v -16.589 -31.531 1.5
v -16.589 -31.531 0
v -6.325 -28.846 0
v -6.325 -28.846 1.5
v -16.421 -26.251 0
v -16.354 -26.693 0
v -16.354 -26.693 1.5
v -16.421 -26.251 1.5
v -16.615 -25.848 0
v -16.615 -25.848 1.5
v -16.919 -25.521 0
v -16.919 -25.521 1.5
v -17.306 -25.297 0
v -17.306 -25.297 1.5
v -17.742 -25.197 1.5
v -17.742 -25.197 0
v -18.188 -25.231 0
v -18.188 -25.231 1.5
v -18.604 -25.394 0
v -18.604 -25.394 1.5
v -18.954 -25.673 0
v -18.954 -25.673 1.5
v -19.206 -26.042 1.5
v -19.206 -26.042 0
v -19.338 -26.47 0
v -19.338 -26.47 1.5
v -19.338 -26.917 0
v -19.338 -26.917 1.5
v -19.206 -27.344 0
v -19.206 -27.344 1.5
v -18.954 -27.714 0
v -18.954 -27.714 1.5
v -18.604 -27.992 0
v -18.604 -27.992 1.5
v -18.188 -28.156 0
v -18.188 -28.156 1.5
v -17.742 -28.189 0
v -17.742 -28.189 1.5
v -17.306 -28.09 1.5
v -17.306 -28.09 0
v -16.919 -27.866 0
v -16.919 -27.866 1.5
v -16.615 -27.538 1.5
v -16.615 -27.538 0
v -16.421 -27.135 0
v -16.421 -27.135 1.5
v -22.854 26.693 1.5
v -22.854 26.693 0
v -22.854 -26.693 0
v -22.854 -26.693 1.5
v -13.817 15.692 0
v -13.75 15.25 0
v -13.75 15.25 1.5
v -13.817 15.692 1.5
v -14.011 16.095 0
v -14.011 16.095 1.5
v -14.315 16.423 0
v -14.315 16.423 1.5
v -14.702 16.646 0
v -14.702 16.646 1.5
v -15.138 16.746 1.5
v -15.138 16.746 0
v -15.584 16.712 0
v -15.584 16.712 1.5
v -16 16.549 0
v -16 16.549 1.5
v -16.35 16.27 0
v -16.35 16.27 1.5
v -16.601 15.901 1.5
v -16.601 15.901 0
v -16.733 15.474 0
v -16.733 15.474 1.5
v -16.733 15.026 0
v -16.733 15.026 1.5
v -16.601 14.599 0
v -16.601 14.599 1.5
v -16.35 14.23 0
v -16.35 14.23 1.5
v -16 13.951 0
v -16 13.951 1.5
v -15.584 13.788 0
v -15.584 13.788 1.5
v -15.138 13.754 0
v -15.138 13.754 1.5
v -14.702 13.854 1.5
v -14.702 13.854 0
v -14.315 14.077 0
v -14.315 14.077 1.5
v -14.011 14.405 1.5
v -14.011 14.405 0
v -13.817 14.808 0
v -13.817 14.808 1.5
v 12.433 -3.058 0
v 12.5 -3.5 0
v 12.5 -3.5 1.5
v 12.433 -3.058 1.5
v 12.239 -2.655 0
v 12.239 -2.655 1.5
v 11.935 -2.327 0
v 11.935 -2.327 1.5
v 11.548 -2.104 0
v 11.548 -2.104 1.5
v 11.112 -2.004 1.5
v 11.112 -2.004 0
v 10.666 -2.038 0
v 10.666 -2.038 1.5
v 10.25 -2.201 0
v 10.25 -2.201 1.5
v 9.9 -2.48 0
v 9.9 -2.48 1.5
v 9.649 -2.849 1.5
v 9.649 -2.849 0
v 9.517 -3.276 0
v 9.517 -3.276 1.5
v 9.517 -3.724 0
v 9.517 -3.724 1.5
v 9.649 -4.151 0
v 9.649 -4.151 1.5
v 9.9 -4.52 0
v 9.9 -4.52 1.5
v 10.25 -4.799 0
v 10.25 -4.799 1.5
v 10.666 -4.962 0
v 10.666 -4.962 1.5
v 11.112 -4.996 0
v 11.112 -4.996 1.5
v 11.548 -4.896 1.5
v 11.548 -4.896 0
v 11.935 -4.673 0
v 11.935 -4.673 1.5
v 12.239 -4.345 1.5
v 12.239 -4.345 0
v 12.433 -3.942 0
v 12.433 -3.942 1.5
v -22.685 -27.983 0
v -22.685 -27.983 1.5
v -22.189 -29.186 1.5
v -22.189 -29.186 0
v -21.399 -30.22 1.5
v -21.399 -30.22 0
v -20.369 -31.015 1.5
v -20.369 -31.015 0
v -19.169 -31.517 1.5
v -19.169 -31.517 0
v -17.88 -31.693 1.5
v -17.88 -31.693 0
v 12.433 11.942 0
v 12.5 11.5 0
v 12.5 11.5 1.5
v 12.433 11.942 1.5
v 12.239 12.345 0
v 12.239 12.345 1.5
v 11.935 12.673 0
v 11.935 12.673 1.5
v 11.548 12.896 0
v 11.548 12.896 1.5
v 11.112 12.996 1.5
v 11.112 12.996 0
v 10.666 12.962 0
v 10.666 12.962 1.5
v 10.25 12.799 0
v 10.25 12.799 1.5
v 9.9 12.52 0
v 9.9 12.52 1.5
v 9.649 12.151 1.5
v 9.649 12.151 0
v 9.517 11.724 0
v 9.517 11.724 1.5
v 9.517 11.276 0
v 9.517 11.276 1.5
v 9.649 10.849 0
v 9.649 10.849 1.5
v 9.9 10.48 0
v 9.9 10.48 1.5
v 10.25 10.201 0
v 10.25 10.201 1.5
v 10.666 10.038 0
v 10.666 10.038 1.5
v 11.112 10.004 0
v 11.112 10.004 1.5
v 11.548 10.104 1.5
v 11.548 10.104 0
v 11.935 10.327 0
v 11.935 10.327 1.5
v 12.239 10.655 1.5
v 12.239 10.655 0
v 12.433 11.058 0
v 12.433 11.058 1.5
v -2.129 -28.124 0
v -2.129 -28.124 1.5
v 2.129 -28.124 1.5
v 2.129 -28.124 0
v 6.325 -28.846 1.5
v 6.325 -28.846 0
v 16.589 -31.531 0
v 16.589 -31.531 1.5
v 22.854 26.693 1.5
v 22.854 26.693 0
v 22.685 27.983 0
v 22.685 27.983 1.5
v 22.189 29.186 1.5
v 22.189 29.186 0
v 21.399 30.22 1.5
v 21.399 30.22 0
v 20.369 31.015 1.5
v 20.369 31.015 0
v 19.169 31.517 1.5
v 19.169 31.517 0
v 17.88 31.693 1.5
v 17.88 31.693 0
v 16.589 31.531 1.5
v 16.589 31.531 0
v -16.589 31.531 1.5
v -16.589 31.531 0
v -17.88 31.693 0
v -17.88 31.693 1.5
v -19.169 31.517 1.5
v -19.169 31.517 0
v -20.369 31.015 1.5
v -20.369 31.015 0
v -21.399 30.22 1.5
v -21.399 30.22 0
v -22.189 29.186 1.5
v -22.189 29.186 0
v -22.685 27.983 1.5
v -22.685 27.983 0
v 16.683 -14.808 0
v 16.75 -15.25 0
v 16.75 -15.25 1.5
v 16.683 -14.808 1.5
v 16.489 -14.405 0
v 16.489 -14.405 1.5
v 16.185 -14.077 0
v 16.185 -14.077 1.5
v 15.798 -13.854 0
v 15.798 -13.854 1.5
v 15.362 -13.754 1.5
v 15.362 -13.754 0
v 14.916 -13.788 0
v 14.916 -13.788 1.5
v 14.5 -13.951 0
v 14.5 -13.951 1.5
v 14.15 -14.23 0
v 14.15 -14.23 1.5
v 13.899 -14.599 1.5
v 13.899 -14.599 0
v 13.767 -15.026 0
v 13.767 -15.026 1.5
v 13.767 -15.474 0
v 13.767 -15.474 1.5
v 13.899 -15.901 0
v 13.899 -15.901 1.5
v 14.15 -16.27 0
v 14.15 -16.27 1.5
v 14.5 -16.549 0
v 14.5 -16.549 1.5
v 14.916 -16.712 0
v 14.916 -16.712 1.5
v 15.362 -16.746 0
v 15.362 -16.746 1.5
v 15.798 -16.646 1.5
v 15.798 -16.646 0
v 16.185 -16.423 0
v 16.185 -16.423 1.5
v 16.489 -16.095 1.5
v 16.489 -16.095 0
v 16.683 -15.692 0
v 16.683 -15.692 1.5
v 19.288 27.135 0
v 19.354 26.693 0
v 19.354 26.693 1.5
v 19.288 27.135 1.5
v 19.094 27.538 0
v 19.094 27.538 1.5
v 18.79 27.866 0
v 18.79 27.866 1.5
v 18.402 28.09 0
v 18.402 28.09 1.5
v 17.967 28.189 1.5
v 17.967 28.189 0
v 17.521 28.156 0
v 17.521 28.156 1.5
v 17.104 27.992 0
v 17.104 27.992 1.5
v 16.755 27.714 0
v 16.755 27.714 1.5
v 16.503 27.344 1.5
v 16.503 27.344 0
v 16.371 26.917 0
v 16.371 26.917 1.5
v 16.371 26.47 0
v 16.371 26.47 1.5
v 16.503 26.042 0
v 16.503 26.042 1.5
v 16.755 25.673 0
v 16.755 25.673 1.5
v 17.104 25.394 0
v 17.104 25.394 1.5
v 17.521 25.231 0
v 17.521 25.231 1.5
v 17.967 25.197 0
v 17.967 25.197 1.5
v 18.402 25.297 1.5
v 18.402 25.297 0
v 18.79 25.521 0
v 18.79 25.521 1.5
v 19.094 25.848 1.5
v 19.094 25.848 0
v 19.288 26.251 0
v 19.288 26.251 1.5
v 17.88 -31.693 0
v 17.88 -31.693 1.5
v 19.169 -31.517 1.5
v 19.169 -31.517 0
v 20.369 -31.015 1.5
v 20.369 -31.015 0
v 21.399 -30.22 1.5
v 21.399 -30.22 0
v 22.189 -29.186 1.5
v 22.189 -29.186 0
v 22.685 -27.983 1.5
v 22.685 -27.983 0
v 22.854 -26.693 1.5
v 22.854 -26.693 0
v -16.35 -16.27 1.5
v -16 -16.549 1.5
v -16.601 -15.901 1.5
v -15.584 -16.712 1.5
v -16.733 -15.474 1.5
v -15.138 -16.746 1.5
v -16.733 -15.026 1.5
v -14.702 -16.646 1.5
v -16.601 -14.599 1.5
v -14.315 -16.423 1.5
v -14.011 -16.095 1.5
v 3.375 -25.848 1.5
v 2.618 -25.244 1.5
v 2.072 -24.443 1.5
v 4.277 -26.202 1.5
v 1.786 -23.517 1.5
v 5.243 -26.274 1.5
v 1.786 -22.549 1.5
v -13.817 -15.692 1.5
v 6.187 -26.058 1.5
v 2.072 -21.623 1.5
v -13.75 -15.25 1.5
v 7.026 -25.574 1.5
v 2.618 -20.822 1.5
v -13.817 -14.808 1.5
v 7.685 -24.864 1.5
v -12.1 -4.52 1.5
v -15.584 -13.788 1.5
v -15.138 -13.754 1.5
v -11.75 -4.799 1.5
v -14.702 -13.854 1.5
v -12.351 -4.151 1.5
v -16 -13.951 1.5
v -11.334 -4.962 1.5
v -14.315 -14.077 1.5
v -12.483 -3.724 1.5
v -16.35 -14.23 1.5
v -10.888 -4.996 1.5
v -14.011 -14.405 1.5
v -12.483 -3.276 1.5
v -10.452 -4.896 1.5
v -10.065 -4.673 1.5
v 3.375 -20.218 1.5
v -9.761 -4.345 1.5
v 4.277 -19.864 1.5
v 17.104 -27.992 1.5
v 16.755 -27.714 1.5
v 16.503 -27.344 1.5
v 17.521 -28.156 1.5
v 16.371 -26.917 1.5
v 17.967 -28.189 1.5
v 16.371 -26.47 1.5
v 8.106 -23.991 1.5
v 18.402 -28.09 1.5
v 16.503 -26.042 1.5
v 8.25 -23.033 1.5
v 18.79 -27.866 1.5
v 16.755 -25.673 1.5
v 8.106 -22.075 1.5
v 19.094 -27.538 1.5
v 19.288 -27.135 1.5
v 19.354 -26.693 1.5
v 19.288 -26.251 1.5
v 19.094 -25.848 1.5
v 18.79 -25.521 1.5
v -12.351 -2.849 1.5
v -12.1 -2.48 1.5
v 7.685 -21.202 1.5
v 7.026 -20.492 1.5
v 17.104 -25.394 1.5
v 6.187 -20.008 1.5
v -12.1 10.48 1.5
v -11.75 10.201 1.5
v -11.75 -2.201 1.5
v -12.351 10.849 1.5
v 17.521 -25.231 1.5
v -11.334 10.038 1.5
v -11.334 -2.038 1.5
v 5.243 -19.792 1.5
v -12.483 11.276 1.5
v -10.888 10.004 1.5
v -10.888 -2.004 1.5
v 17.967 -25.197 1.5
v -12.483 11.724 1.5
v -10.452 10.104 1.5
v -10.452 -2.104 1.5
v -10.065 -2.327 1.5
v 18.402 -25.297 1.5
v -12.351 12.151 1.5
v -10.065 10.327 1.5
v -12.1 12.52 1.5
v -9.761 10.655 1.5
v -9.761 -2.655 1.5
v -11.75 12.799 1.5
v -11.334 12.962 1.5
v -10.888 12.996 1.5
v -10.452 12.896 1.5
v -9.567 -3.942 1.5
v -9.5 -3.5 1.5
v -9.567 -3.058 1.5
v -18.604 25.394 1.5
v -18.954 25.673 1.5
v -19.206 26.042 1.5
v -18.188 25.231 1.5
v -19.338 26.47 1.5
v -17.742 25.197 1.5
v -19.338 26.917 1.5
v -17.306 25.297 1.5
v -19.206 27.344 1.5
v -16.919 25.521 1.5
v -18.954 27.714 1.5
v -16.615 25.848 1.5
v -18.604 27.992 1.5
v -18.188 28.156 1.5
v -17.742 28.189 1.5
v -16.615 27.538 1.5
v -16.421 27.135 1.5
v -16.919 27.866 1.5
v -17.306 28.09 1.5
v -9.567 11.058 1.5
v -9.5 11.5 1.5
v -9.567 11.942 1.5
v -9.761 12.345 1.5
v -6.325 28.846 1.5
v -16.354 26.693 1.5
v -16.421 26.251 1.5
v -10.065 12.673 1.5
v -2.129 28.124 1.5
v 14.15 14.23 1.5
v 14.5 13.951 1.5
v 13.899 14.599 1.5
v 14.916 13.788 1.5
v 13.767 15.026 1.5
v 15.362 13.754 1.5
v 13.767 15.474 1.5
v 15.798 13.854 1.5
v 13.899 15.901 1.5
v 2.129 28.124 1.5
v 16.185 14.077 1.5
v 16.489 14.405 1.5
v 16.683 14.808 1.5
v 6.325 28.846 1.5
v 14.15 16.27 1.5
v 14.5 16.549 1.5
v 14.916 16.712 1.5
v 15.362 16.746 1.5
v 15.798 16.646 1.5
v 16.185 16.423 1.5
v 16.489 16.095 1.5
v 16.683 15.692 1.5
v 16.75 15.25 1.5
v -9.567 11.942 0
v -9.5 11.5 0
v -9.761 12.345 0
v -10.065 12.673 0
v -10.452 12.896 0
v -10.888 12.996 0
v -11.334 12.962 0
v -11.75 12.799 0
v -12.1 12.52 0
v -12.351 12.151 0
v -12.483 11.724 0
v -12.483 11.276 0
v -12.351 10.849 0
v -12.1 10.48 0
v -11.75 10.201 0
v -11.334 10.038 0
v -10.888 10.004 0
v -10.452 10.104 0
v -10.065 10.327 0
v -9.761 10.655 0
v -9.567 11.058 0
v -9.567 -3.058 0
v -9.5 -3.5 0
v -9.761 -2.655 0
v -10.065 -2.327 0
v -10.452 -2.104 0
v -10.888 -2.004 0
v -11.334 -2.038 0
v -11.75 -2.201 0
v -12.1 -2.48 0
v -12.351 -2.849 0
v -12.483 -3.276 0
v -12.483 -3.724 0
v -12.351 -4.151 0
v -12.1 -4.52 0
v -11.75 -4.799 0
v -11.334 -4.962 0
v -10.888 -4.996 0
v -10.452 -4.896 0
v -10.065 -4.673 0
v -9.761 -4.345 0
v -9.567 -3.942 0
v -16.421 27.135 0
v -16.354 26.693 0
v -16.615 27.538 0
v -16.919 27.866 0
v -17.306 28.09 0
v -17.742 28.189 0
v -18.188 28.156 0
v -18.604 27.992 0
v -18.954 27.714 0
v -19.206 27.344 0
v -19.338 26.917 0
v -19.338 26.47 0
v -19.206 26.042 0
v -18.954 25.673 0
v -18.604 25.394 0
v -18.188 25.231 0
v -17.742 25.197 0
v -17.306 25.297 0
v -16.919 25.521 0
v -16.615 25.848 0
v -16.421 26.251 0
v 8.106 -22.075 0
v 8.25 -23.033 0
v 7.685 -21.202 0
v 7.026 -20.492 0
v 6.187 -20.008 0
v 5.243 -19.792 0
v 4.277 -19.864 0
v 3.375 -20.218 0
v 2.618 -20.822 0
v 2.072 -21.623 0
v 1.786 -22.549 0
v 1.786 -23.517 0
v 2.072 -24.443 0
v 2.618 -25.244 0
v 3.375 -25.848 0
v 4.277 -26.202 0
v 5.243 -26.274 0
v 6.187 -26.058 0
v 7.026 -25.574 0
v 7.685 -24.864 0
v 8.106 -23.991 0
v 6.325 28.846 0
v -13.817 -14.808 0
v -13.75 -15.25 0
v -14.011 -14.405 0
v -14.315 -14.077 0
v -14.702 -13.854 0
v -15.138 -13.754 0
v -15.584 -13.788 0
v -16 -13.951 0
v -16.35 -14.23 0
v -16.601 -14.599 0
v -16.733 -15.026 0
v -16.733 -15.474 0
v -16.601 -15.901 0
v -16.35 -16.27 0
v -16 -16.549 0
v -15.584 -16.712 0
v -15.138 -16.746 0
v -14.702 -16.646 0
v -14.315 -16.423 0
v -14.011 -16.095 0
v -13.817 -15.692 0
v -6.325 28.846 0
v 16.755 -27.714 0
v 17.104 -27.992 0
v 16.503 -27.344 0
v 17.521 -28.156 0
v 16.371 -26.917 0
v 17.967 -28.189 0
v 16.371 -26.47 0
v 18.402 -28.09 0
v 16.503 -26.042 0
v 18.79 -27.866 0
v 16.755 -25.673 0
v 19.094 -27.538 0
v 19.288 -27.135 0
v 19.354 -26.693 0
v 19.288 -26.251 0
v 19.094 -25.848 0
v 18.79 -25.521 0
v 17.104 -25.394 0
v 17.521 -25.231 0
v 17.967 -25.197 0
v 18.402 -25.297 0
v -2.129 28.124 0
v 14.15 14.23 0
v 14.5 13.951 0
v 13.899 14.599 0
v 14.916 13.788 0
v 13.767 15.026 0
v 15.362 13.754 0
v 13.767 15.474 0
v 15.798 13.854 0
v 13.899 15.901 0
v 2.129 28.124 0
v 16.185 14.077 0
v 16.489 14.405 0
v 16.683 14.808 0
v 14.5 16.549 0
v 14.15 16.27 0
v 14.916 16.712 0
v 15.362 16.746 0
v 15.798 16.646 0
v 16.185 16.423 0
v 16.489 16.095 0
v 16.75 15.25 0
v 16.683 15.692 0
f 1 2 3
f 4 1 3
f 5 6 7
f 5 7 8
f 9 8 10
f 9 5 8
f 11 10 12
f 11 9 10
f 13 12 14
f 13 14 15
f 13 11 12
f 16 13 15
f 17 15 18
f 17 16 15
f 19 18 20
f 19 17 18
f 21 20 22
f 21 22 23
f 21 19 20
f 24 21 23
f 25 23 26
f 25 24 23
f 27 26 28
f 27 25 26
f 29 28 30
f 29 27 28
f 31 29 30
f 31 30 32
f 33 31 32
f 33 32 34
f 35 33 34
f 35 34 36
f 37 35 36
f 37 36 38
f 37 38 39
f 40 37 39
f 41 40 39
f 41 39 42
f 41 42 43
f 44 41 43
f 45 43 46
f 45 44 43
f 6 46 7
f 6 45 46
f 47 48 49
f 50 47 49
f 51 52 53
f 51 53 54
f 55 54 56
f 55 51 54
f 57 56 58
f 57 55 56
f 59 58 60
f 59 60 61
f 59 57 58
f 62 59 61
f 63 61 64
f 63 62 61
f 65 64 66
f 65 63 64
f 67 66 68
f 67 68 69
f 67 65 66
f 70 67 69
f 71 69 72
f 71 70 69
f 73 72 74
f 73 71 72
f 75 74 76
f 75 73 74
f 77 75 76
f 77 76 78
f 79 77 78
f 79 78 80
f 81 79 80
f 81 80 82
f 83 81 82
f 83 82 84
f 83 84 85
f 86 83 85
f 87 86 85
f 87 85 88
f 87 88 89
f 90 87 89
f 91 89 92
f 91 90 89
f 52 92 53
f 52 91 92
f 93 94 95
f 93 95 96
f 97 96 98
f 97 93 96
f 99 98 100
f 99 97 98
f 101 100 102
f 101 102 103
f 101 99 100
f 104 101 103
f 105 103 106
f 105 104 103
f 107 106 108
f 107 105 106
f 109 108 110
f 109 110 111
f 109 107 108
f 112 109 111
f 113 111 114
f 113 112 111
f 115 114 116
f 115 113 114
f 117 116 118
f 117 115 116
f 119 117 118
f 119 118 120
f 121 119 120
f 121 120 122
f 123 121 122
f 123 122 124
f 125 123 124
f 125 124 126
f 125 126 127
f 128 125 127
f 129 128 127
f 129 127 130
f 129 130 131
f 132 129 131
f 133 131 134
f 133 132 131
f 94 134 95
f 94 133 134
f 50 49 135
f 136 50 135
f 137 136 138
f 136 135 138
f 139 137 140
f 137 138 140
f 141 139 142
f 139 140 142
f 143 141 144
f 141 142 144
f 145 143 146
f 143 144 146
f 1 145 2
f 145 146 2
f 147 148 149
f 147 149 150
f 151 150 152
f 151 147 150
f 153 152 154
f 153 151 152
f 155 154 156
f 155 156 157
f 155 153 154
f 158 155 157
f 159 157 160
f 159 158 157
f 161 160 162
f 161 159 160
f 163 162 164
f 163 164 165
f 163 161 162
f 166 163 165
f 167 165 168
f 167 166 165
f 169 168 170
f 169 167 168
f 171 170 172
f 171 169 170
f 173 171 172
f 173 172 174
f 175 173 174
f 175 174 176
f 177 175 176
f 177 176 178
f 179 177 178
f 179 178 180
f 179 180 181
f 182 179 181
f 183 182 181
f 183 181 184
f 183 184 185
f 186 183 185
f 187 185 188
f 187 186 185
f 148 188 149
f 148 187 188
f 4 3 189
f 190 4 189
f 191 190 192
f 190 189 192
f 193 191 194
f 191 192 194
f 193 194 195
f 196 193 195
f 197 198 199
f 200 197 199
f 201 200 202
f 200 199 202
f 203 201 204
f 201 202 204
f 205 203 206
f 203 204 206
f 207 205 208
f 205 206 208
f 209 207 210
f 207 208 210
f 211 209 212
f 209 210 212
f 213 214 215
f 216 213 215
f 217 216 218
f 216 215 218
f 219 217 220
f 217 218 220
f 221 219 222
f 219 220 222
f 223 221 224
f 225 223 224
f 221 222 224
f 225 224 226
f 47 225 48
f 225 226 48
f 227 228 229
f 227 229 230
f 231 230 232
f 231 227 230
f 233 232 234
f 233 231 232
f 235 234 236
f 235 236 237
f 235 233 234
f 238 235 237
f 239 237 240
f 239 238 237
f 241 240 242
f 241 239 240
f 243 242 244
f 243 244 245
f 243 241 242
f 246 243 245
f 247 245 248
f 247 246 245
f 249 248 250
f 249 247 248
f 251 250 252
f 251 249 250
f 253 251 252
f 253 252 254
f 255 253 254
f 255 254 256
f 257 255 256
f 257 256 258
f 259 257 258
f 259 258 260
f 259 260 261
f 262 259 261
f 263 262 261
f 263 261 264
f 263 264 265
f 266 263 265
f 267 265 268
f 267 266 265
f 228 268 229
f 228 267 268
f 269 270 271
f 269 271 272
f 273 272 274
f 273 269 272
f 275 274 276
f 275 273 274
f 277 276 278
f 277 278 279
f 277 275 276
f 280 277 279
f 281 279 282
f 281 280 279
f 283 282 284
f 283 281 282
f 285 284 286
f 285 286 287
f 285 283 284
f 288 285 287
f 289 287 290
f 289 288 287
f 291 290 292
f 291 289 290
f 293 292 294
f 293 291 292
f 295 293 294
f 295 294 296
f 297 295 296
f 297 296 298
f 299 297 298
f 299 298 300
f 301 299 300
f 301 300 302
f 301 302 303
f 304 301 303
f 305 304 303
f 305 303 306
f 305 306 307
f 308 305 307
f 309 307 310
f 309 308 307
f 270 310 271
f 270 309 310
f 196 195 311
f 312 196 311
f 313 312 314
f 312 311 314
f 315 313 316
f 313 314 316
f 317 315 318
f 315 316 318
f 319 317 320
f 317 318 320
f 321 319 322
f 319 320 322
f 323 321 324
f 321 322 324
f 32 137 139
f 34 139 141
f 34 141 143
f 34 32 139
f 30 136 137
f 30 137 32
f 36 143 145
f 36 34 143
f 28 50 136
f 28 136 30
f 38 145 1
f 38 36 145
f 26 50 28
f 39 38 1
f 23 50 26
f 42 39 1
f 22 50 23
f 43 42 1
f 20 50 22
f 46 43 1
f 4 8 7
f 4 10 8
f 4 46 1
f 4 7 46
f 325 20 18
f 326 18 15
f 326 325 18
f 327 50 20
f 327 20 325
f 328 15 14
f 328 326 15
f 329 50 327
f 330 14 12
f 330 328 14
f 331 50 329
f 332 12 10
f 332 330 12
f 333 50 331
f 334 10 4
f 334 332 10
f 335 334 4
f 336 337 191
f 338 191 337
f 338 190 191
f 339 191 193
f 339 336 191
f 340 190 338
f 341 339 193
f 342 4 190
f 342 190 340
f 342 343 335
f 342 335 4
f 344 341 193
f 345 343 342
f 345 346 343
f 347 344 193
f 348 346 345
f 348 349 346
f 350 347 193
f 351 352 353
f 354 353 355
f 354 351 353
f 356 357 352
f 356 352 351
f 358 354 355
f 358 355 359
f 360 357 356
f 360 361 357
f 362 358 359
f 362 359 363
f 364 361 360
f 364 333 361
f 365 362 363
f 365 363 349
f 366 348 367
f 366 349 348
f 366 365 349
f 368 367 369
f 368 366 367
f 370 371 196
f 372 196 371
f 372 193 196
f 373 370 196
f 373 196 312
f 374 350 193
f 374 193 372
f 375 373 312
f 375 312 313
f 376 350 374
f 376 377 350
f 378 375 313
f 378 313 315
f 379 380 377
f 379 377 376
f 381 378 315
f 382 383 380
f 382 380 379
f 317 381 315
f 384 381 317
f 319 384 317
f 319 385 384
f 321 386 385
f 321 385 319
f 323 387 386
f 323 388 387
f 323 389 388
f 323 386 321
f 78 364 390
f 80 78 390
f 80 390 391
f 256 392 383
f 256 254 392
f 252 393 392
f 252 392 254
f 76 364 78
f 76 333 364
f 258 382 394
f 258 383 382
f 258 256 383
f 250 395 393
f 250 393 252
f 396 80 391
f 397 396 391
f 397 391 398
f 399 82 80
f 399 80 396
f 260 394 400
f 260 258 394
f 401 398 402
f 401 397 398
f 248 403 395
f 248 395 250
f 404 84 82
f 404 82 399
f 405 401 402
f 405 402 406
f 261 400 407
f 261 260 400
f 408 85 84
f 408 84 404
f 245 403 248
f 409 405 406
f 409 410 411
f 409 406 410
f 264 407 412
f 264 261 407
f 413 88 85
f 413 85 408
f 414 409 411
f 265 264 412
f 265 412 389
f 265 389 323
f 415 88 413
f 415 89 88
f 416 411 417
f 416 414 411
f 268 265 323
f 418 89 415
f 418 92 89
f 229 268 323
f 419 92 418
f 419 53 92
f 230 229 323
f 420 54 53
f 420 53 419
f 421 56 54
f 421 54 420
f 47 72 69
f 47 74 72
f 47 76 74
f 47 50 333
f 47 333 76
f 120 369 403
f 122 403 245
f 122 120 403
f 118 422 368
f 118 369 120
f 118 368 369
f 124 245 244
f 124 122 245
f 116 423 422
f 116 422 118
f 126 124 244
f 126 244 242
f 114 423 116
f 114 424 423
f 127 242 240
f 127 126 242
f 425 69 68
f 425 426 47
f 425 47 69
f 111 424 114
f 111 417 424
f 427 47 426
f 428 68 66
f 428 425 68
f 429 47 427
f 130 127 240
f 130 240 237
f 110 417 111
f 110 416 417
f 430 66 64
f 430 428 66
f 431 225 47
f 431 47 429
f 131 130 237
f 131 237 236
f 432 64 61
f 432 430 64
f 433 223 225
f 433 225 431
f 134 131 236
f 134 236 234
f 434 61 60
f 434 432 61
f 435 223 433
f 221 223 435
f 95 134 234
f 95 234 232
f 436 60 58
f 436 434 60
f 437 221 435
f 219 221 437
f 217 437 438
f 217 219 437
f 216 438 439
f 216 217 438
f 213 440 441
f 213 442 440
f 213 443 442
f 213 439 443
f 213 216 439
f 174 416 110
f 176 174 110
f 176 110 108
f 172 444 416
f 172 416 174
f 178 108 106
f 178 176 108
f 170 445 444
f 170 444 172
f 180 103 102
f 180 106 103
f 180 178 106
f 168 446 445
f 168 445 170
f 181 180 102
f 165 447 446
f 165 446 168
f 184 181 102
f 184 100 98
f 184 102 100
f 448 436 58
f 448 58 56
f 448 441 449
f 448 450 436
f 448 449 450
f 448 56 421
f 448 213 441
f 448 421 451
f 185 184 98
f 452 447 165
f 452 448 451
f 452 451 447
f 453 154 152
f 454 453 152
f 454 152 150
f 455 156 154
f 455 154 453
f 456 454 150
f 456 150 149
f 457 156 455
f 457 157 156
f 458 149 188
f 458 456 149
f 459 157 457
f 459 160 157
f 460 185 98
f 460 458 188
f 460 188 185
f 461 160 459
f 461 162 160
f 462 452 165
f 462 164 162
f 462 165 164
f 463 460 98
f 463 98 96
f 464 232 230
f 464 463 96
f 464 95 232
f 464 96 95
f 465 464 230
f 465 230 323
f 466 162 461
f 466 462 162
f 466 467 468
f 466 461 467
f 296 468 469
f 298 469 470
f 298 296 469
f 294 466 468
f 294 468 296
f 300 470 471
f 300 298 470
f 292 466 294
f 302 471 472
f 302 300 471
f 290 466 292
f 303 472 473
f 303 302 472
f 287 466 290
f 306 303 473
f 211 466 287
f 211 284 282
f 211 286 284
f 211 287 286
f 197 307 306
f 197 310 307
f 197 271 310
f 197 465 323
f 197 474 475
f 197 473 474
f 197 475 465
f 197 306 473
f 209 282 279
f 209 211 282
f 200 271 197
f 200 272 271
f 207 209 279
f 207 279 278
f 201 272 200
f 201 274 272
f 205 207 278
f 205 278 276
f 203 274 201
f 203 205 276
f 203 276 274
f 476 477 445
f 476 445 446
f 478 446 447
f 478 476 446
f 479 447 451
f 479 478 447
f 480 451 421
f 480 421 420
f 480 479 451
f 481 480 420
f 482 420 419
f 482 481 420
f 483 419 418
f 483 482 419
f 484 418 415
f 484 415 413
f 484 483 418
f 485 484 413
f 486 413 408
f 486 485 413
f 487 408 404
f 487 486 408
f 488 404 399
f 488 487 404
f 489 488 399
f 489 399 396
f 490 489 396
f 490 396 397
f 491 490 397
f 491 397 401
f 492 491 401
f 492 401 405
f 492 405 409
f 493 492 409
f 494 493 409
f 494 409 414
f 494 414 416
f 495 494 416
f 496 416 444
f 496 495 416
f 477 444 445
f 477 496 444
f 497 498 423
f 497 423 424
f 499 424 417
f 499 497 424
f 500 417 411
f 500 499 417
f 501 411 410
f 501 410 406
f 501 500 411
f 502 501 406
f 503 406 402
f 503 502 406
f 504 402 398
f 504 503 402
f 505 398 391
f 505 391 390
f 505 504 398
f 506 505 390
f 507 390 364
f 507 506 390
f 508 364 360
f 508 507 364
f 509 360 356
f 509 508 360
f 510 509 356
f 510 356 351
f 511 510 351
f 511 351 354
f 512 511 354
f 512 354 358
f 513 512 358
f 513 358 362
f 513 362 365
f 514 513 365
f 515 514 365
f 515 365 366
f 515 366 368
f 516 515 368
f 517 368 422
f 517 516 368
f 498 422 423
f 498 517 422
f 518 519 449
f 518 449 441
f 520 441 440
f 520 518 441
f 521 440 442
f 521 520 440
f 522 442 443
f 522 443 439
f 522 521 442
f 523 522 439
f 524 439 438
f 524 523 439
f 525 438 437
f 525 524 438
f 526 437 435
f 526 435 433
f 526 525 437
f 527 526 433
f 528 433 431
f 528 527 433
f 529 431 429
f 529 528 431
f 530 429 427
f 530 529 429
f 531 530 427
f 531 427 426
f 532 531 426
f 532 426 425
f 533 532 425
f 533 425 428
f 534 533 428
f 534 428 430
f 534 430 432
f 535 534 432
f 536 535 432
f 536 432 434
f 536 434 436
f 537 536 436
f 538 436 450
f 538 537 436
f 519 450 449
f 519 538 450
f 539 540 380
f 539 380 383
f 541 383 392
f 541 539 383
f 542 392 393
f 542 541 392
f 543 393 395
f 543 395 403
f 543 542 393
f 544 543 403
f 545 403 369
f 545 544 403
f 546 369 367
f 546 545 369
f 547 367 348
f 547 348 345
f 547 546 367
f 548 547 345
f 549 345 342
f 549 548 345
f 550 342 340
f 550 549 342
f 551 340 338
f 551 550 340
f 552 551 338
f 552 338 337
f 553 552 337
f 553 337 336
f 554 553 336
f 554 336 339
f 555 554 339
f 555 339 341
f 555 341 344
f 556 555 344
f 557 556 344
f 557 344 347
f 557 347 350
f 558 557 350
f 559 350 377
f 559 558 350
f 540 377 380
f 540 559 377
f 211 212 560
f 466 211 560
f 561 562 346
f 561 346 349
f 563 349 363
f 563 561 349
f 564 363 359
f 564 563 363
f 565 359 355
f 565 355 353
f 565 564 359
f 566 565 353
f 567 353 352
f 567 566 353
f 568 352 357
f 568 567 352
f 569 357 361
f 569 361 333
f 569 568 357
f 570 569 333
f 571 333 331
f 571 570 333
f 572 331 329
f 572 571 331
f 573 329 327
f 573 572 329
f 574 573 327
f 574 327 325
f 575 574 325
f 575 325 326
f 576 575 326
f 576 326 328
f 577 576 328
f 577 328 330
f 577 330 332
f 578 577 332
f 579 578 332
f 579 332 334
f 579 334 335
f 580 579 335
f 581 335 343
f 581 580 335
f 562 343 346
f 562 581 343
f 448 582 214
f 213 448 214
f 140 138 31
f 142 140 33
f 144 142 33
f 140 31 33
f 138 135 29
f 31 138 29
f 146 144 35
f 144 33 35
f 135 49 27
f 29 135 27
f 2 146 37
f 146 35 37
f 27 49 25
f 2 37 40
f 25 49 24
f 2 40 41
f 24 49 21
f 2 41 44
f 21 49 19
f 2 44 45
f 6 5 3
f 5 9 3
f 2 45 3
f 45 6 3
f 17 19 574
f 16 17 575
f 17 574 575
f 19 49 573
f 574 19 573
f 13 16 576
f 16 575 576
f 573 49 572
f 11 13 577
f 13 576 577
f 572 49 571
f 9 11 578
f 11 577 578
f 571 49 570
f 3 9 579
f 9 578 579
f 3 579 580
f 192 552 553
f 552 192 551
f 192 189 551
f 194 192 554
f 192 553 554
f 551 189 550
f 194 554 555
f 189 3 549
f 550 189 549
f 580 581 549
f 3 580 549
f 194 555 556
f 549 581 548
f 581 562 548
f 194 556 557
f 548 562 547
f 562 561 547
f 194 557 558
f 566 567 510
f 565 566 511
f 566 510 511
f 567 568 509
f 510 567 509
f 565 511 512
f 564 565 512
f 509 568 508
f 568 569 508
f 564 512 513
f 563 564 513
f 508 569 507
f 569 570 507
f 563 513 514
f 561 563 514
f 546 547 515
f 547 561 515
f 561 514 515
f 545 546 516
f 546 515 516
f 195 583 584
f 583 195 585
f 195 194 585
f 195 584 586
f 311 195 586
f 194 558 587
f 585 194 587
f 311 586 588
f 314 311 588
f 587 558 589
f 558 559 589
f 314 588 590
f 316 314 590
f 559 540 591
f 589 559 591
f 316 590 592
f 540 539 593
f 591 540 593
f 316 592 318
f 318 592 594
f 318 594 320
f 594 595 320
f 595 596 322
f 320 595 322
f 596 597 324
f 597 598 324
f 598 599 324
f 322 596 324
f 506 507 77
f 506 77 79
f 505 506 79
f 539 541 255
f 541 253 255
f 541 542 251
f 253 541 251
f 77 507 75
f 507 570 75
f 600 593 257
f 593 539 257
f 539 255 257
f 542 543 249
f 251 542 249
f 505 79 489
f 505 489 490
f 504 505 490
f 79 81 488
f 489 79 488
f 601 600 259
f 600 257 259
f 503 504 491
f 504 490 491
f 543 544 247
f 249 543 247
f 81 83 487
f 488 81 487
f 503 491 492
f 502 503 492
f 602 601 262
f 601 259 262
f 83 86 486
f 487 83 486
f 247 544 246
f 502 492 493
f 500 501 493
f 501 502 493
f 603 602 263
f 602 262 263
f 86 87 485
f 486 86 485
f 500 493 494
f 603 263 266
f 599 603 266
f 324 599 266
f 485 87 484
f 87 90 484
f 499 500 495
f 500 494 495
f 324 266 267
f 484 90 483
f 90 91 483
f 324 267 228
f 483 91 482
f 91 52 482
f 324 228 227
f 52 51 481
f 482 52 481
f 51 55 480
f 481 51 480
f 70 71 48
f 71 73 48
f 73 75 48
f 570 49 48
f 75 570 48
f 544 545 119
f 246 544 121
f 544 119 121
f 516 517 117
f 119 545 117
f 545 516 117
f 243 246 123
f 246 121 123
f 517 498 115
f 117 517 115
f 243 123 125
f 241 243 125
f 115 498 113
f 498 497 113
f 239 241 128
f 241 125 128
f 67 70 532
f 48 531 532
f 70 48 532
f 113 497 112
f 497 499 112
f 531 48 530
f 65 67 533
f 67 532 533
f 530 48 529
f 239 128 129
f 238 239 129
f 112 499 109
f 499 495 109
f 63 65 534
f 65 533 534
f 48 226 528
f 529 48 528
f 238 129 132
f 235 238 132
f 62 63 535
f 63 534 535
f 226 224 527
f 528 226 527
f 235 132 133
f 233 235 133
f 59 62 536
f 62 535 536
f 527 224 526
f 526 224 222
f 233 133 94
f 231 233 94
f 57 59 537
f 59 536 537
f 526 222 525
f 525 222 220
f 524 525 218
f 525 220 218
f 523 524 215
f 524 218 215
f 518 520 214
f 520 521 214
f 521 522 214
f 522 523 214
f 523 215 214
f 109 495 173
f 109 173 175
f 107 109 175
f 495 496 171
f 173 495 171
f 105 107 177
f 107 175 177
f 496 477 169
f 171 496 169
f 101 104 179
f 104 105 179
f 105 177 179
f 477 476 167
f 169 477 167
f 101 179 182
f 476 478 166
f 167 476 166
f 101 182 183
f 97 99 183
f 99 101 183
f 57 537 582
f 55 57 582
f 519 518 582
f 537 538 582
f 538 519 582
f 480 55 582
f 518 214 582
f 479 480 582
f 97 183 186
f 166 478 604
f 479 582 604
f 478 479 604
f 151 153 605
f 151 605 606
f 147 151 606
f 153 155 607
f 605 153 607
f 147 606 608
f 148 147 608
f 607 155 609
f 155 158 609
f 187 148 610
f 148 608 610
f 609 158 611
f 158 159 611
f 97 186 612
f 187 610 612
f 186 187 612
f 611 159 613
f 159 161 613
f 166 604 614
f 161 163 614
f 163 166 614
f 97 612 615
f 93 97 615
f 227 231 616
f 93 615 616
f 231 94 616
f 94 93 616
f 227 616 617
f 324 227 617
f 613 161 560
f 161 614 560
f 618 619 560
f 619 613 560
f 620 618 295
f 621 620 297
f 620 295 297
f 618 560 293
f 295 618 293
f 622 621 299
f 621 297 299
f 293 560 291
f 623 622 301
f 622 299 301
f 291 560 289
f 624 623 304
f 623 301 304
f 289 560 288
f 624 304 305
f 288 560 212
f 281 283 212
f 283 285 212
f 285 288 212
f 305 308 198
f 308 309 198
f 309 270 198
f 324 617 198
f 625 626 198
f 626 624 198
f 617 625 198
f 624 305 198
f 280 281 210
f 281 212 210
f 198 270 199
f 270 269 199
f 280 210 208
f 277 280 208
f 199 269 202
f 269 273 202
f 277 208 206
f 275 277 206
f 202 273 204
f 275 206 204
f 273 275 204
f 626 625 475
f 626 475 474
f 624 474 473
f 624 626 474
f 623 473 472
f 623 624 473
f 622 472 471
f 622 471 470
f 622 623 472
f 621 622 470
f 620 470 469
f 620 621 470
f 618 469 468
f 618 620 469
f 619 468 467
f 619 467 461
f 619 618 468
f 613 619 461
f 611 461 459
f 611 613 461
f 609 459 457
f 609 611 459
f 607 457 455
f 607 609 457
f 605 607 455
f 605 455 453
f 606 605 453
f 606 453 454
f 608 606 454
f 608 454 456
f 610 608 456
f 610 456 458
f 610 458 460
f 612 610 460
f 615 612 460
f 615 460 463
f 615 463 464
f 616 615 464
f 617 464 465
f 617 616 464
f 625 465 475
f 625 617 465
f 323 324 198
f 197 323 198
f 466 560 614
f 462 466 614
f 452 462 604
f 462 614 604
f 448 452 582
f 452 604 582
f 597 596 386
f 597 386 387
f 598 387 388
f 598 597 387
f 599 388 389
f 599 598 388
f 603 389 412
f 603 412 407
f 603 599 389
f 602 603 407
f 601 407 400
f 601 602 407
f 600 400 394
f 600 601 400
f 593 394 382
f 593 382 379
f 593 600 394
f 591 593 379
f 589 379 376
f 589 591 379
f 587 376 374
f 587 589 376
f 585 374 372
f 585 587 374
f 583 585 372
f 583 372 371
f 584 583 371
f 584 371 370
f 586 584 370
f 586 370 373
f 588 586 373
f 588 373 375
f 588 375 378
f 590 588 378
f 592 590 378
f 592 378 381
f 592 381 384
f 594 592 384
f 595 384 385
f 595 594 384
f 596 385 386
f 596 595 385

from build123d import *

# Parameters (mm, degrees)
F0_R     = 1.5
F0_R_2   = 3.25
F1_DEPTH = 1.5


# Not quite as in the source:
# - ends of sketch curves that miss each other by under 0.0002 mm in the source are joined


with BuildPart() as f1:
    # F0 (on Top) → F1 (new body)
    with BuildSketch(Plane.XY):
        with BuildLine():
            ThreePointArc((6.3250610024, 28.8463679906), (-4.837e-07, 28.033009), (-6.3250619384, 28.8463682354))
            Line((-6.3250619384, 28.8463682354), (-16.589434, 31.530609))
            ThreePointArc((-16.589434, 31.530609), (-20.910174001, 30.6508727545), (-22.854447, 26.693281))
            Line((-22.854447, 26.693281), (-22.854447, -26.693281))
            ThreePointArc((-22.854447, -26.693281), (-20.910174001, -30.6508727545), (-16.5894340018, -31.5306089933))
            Line((-16.5894340018, -31.5306089933), (-6.325062, -28.846368))
            ThreePointArc((-6.325062, -28.846368), (-4.837e-07, -28.033009), (6.3250610024, -28.8463679906))
            Line((6.3250610024, -28.8463679906), (16.589434, -31.530609))
            ThreePointArc((16.589434, -31.530609), (20.9101733838, -30.6508724589), (22.854446, -26.693281))
            Line((22.854446, -26.693281), (22.854446, 26.693281))
            ThreePointArc((22.854446, 26.693281), (20.9101733838, 30.6508724589), (16.5894339378, 31.530609238))
            Line((16.5894339378, 31.530609238), (6.3250610024, 28.8463679906))
        make_face()
        with Locations((-17.854447, -26.693281)):
            Circle(F0_R, mode=Mode.SUBTRACT)
        with Locations((-15.25, -15.25)):
            Circle(F0_R, mode=Mode.SUBTRACT)
        with Locations((-11, -3.5)):
            Circle(F0_R, mode=Mode.SUBTRACT)
        with Locations((5, -23.033009)):
            Circle(F0_R_2, mode=Mode.SUBTRACT)
        with Locations((17.854446, -26.693281)):
            Circle(F0_R, mode=Mode.SUBTRACT)
        with Locations((11, -3.5)):
            Circle(F0_R, mode=Mode.SUBTRACT)
        with Locations((15.25, -15.25)):
            Circle(F0_R, mode=Mode.SUBTRACT)
        with Locations((-15.25, 15.25)):
            Circle(F0_R, mode=Mode.SUBTRACT)
        with Locations((-11, 11.5)):
            Circle(F0_R, mode=Mode.SUBTRACT)
        with Locations((-17.854447, 26.693281)):
            Circle(F0_R, mode=Mode.SUBTRACT)
        with Locations((11, 11.5)):
            Circle(F0_R, mode=Mode.SUBTRACT)
        with Locations((15.25, 15.25)):
            Circle(F0_R, mode=Mode.SUBTRACT)
        with Locations((17.854446, 26.693281)):
            Circle(F0_R, mode=Mode.SUBTRACT)
    extrude(amount=F1_DEPTH)


solid = f1.part
